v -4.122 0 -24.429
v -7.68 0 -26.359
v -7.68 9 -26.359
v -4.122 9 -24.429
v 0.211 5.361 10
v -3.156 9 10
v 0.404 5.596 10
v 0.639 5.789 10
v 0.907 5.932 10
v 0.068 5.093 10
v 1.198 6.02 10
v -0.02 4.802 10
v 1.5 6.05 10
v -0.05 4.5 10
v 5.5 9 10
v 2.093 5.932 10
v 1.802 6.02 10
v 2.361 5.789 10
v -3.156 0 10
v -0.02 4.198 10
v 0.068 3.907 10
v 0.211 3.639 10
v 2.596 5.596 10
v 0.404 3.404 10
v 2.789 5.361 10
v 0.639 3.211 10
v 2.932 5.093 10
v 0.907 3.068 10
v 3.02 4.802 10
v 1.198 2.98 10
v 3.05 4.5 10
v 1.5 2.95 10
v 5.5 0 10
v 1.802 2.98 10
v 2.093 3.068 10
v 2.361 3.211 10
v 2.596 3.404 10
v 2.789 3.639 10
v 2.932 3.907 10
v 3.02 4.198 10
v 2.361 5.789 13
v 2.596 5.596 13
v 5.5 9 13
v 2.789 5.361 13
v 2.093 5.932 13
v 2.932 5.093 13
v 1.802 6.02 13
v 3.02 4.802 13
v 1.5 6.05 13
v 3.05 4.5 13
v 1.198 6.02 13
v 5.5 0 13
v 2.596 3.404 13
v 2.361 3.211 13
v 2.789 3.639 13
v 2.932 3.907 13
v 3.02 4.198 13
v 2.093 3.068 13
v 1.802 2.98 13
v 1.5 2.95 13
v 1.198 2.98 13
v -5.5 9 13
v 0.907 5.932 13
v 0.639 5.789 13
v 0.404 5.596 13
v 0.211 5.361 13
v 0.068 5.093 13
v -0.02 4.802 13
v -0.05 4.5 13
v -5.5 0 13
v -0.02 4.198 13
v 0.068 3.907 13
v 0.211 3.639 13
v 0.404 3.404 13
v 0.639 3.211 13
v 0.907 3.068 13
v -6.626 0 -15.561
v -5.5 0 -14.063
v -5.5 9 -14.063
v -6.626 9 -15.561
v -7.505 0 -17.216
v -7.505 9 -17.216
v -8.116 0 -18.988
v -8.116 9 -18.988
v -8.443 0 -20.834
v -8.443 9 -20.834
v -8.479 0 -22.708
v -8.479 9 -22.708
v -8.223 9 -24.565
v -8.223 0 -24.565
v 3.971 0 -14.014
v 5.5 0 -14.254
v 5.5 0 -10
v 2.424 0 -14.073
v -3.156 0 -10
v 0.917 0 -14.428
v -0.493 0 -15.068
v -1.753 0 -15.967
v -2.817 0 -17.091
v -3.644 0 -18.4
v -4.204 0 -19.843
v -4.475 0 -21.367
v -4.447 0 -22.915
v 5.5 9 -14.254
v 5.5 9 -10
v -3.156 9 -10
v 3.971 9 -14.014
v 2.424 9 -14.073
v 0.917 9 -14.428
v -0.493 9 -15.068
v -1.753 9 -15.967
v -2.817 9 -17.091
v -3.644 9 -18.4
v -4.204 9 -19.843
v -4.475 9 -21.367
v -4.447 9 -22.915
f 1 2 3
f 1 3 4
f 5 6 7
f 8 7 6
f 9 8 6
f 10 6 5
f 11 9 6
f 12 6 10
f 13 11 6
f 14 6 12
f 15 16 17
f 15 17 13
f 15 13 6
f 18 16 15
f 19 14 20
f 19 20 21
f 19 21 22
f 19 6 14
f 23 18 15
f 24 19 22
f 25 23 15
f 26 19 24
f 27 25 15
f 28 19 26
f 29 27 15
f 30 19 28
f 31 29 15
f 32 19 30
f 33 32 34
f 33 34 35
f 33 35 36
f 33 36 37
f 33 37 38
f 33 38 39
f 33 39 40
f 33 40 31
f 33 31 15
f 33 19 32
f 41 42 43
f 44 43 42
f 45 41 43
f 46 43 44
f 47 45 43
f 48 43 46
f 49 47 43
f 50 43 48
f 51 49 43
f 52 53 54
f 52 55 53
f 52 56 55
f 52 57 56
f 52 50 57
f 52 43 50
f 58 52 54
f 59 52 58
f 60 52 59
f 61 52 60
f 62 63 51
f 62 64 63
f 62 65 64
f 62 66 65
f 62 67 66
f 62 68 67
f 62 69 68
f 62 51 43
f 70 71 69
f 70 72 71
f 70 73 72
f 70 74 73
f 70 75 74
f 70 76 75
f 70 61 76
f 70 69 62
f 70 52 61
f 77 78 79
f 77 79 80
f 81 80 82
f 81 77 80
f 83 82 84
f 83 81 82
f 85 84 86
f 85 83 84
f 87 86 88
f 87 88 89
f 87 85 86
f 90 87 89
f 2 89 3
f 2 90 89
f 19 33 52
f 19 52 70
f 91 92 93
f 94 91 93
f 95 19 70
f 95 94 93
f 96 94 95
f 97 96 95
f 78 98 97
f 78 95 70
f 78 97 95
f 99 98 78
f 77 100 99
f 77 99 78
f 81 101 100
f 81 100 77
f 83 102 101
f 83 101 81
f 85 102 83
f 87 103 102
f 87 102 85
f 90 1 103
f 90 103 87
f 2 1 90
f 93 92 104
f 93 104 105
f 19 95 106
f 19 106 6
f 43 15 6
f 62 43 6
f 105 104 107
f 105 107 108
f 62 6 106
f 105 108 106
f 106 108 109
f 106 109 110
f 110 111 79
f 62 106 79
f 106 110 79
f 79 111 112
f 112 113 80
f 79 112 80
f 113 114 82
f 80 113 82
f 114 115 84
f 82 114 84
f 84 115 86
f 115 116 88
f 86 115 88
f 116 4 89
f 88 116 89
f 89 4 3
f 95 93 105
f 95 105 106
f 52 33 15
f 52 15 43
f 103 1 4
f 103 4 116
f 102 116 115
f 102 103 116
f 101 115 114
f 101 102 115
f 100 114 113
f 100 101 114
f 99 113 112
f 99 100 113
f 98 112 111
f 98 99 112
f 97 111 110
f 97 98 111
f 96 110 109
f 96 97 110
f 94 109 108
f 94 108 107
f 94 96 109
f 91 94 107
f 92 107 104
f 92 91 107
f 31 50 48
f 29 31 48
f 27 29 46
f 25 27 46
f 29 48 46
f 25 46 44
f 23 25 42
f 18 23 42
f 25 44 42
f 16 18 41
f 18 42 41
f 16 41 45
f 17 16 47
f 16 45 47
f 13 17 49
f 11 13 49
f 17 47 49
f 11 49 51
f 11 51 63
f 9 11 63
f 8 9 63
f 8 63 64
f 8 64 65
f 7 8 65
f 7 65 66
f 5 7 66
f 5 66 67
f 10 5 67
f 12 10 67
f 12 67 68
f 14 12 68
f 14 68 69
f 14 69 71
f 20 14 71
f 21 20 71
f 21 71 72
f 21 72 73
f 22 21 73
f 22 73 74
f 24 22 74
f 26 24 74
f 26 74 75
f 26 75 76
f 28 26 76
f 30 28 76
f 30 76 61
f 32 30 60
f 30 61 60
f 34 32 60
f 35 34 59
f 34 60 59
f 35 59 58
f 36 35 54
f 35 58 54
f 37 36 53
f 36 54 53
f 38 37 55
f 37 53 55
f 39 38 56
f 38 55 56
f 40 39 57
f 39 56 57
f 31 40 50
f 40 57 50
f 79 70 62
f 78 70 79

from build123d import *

# Parameters (mm, degrees)
BOSS_EXTRUDE1_DEPTH = 9
SKETCH2_R           = 1.55
CUT_EXTRUDE1_DEPTH  = 10


with BuildPart() as part:
    # Sketch1 → Boss-Extrude1 (new body)
    with BuildSketch(Plane(origin=(0, 0, 0), x_dir=(1, 0, 0), z_dir=(0, 1, 0))):
        with BuildLine():
            Line((5.5, 14.254033308), (5.5, 10))
            Line((5.5, 10), (-3.155943876, 10))
            Line((-3.155943876, 10), (-3.155943876, -10))
            Line((-3.155943876, -10), (5.5, -10))
            Line((5.5, -10), (5.5, -13))
            Line((5.5, -13), (-5.5, -13))
            Line((-5.5, -13), (-5.5, 14.062746067))
            ThreePointArc((-5.5, 14.062746067), (-8.315661291, 19.904731936), (-7.680431732, 26.358663359))
            Line((-7.680431732, 26.358663359), (-4.122387432, 24.428828902))
            ThreePointArc((-4.122387432, 24.428828902), (-2.312437222, 16.503130569), (5.5, 14.254033308))
        make_face()
    extrude(amount=BOSS_EXTRUDE1_DEPTH)

    # Sketch2 → Cut-Extrude1 (cut)
    with BuildSketch(Plane.XY.offset(13)):
        with Locations((1.5, 4.5)):
            Circle(SKETCH2_R)
    extrude(amount=-CUT_EXTRUDE1_DEPTH, mode=Mode.SUBTRACT)


solid = part.part
